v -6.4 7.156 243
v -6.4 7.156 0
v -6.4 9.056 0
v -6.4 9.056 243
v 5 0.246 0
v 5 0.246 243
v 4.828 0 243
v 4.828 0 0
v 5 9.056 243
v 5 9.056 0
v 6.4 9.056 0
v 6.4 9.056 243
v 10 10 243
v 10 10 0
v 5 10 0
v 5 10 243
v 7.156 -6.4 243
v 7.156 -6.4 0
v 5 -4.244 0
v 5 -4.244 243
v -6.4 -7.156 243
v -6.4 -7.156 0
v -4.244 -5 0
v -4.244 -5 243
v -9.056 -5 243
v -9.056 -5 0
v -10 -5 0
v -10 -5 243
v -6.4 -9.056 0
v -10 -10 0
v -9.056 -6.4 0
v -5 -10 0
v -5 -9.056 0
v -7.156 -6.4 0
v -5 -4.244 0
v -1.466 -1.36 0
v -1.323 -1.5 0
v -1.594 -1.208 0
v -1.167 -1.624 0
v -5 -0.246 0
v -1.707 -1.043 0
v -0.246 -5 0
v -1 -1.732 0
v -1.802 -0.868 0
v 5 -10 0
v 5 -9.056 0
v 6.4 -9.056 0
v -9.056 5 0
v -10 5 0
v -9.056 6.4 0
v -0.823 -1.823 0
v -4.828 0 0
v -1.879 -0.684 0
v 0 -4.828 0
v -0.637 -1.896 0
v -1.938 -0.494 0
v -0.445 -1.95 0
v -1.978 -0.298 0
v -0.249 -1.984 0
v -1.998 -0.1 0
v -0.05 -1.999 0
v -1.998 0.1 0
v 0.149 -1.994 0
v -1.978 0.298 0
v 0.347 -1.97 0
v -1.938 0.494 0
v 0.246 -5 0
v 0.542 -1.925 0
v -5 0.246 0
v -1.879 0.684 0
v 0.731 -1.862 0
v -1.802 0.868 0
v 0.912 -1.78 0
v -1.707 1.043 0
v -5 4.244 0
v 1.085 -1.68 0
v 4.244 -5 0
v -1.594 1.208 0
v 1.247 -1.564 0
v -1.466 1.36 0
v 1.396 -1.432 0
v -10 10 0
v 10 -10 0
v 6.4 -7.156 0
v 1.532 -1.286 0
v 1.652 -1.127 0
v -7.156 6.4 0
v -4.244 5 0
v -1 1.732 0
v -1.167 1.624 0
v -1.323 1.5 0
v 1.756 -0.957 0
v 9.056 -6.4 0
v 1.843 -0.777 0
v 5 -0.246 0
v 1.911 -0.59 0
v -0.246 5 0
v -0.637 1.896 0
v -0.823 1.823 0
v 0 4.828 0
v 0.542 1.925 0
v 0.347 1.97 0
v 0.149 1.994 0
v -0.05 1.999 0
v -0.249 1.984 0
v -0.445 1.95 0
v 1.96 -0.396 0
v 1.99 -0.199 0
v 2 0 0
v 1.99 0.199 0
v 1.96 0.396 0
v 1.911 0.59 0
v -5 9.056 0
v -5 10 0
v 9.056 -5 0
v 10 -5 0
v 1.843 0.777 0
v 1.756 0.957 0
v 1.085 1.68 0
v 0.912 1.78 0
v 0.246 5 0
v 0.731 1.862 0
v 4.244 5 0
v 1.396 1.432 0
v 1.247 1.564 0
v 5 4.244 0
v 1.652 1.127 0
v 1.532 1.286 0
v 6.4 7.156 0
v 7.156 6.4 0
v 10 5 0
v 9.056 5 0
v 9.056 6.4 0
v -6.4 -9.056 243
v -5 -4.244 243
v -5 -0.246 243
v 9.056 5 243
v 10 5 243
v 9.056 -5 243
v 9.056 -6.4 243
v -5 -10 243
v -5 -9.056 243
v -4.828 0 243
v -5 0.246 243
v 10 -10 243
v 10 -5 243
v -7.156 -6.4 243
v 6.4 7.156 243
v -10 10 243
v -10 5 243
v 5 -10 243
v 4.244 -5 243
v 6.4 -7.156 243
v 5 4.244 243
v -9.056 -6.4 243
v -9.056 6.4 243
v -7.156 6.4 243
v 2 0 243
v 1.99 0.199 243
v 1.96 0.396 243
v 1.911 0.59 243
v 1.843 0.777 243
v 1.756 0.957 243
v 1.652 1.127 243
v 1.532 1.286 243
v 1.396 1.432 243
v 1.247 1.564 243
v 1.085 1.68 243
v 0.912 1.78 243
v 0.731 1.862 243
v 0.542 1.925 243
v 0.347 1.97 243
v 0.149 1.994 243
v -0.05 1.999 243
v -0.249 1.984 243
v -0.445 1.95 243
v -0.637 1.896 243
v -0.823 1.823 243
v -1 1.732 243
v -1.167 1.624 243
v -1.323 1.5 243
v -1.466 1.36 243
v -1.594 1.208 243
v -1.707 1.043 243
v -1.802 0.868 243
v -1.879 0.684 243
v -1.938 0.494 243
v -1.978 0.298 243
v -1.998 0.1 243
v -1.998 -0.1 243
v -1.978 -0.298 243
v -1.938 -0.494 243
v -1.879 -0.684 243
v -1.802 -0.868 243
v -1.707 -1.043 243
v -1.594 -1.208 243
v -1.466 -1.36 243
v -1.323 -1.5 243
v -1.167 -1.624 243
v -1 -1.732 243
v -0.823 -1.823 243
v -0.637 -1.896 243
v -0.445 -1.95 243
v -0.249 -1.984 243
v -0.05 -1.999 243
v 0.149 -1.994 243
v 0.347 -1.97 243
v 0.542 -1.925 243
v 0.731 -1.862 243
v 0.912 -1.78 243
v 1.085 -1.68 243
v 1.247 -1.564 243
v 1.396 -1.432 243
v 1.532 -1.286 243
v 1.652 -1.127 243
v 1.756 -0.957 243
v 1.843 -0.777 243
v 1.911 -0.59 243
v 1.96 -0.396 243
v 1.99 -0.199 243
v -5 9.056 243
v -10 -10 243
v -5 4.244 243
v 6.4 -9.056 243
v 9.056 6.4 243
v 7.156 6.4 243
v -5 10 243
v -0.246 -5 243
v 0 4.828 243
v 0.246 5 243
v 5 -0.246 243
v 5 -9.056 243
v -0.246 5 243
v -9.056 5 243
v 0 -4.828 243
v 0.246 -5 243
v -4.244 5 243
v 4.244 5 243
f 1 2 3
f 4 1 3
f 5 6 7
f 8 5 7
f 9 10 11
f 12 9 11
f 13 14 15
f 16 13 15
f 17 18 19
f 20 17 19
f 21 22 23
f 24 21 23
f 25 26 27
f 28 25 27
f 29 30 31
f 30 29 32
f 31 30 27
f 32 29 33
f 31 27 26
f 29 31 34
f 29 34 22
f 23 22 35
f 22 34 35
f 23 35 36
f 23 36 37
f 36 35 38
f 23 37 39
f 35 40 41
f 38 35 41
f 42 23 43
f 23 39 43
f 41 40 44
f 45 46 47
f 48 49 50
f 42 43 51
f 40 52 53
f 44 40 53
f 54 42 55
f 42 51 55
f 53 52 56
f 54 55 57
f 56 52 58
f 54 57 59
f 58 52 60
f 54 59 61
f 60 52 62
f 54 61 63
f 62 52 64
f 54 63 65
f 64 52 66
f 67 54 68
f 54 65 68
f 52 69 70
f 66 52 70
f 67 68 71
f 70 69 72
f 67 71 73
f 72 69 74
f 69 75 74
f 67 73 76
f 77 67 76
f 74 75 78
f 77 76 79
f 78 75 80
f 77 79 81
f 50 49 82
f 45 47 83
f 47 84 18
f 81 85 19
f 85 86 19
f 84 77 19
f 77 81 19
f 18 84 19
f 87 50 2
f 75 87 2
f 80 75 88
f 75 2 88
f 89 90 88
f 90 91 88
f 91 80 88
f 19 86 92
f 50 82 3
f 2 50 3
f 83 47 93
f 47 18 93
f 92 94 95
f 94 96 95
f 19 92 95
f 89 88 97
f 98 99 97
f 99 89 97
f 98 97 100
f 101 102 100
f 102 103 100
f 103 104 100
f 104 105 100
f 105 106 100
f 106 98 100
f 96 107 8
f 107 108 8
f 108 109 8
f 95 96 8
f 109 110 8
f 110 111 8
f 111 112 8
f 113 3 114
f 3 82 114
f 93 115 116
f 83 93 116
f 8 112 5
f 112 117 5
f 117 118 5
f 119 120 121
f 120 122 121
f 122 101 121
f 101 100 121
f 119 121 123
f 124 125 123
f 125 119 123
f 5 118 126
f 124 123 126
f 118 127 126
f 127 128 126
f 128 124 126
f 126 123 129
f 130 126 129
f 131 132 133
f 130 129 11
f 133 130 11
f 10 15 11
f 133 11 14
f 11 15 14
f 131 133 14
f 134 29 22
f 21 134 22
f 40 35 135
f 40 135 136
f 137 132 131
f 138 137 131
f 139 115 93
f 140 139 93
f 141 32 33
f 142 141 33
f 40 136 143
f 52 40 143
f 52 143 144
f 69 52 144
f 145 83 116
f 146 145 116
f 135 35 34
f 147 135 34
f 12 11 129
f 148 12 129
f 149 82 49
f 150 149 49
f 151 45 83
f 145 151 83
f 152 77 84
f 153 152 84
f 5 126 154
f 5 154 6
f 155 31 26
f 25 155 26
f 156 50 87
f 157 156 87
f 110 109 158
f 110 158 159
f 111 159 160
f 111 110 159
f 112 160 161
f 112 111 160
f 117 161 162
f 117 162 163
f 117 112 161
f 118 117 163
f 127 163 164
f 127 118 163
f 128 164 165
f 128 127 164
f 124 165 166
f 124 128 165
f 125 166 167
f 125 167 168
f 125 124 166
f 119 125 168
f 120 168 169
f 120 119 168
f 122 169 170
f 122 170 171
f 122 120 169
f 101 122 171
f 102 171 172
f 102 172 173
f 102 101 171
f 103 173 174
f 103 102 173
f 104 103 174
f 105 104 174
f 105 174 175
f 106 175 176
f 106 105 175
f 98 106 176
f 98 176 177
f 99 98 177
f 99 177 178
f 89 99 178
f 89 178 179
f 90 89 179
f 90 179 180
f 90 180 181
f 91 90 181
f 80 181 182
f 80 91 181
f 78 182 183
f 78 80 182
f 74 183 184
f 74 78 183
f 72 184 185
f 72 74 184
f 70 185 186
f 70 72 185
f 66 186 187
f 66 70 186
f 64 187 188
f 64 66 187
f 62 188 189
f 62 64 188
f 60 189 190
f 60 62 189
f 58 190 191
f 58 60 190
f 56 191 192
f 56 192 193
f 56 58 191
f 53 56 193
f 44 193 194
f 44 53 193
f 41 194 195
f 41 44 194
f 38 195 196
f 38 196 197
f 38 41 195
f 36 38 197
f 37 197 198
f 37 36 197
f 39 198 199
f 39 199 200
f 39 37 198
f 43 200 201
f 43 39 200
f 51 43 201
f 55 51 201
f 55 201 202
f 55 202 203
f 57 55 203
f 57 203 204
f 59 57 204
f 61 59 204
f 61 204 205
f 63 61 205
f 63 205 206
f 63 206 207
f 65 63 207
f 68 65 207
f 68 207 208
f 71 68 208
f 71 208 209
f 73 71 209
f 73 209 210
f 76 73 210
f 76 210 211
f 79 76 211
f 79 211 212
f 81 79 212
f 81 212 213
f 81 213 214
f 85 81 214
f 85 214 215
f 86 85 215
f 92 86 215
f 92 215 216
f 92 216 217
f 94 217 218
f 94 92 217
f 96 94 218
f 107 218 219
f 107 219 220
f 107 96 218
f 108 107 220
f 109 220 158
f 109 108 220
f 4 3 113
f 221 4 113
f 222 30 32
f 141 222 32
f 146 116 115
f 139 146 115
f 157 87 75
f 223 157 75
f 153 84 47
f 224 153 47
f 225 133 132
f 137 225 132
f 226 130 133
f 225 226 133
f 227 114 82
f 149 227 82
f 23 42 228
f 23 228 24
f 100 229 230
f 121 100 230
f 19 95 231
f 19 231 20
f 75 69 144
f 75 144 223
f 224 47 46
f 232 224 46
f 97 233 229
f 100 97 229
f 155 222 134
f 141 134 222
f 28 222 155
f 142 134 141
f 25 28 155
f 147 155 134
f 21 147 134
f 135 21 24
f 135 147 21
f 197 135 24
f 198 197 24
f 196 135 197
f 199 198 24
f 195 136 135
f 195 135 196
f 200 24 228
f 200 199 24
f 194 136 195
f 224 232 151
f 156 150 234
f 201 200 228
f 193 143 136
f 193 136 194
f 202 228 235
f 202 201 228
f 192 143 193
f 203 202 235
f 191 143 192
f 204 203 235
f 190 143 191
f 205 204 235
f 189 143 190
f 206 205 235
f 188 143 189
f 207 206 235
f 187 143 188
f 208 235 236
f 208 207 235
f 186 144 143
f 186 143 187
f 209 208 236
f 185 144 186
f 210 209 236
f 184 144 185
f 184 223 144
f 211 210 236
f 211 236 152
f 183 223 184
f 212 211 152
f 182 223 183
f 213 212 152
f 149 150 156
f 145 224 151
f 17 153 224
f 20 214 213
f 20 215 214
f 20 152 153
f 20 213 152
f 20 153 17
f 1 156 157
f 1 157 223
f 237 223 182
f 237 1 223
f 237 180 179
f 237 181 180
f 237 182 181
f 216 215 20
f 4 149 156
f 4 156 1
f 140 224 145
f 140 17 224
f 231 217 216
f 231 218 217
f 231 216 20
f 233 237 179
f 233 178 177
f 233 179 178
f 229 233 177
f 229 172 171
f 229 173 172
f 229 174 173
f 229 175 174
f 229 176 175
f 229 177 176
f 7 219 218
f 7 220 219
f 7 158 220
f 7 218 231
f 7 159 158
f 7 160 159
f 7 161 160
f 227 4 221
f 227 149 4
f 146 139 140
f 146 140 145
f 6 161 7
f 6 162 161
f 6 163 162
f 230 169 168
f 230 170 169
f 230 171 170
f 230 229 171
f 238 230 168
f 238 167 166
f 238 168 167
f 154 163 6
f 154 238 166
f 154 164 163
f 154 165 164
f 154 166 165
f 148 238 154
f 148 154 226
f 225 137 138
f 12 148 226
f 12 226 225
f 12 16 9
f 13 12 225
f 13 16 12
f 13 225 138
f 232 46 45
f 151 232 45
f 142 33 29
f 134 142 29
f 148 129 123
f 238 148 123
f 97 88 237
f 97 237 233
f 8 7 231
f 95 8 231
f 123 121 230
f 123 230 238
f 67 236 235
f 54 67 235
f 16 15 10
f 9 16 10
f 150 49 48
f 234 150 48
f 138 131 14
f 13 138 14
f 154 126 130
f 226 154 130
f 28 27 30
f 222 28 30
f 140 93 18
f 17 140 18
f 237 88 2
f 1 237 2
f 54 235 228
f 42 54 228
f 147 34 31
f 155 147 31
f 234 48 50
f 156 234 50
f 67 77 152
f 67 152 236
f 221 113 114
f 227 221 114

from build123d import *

# Parameters (mm, degrees)
SKETCH1_R           = 2
BOSS_EXTRUDE1_DEPTH = 243


with BuildPart() as part:
    # Sketch1 → Boss-Extrude1 (new body)
    with BuildSketch(Plane.XY):
        Polygon((6.4, 7.156263811), (4.243736189, 5), (5, 5), (5, 4.243736189), (7.156263811, 6.4), (9.056263811, 6.4), (9.056263811, 5), (10, 5), (10, 10), (5, 10), (5, 9.056263811), (6.4, 9.056263811), align=None)
        Polygon((-5, 0.245745613), (-5, 5), (-0.245745613, 5), (0, 4.827927069), (0.245745613, 5), (5, 5), (5, 0.245745613), (4.827927069, 0), (5, -0.245745613), (5, -5), (0.245745613, -5), (0, -4.827927069), (-0.245745613, -5), (-5, -5), (-5, -0.245745613), (-4.827927069, 0), align=None)
        Circle(SKETCH1_R, mode=Mode.SUBTRACT)
        Polygon((-10, 10), (-10, 5), (-9.056263811, 5), (-9.056263811, 6.4), (-7.156263811, 6.4), (-5, 4.243736189), (-5, 5), (-4.243736189, 5), (-6.4, 7.156263811), (-6.4, 9.056263811), (-5, 9.056263811), (-5, 10), align=None)
        Polygon((-5, -5), (-5, -4.243736189), (-7.156263811, -6.4), (-9.056263811, -6.4), (-9.056263811, -5), (-10, -5), (-10, -10), (-5, -10), (-5, -9.056263811), (-6.4, -9.056263811), (-6.4, -7.156263811), (-4.243736189, -5), align=None)
        Polygon((5, -5), (4.243736189, -5), (6.4, -7.156263811), (6.4, -9.056263811), (5, -9.056263811), (5, -10), (10, -10), (10, -5), (9.056263811, -5), (9.056263811, -6.4), (7.156263811, -6.4), (5, -4.243736189), align=None)
    extrude(amount=BOSS_EXTRUDE1_DEPTH)


solid = part.part
